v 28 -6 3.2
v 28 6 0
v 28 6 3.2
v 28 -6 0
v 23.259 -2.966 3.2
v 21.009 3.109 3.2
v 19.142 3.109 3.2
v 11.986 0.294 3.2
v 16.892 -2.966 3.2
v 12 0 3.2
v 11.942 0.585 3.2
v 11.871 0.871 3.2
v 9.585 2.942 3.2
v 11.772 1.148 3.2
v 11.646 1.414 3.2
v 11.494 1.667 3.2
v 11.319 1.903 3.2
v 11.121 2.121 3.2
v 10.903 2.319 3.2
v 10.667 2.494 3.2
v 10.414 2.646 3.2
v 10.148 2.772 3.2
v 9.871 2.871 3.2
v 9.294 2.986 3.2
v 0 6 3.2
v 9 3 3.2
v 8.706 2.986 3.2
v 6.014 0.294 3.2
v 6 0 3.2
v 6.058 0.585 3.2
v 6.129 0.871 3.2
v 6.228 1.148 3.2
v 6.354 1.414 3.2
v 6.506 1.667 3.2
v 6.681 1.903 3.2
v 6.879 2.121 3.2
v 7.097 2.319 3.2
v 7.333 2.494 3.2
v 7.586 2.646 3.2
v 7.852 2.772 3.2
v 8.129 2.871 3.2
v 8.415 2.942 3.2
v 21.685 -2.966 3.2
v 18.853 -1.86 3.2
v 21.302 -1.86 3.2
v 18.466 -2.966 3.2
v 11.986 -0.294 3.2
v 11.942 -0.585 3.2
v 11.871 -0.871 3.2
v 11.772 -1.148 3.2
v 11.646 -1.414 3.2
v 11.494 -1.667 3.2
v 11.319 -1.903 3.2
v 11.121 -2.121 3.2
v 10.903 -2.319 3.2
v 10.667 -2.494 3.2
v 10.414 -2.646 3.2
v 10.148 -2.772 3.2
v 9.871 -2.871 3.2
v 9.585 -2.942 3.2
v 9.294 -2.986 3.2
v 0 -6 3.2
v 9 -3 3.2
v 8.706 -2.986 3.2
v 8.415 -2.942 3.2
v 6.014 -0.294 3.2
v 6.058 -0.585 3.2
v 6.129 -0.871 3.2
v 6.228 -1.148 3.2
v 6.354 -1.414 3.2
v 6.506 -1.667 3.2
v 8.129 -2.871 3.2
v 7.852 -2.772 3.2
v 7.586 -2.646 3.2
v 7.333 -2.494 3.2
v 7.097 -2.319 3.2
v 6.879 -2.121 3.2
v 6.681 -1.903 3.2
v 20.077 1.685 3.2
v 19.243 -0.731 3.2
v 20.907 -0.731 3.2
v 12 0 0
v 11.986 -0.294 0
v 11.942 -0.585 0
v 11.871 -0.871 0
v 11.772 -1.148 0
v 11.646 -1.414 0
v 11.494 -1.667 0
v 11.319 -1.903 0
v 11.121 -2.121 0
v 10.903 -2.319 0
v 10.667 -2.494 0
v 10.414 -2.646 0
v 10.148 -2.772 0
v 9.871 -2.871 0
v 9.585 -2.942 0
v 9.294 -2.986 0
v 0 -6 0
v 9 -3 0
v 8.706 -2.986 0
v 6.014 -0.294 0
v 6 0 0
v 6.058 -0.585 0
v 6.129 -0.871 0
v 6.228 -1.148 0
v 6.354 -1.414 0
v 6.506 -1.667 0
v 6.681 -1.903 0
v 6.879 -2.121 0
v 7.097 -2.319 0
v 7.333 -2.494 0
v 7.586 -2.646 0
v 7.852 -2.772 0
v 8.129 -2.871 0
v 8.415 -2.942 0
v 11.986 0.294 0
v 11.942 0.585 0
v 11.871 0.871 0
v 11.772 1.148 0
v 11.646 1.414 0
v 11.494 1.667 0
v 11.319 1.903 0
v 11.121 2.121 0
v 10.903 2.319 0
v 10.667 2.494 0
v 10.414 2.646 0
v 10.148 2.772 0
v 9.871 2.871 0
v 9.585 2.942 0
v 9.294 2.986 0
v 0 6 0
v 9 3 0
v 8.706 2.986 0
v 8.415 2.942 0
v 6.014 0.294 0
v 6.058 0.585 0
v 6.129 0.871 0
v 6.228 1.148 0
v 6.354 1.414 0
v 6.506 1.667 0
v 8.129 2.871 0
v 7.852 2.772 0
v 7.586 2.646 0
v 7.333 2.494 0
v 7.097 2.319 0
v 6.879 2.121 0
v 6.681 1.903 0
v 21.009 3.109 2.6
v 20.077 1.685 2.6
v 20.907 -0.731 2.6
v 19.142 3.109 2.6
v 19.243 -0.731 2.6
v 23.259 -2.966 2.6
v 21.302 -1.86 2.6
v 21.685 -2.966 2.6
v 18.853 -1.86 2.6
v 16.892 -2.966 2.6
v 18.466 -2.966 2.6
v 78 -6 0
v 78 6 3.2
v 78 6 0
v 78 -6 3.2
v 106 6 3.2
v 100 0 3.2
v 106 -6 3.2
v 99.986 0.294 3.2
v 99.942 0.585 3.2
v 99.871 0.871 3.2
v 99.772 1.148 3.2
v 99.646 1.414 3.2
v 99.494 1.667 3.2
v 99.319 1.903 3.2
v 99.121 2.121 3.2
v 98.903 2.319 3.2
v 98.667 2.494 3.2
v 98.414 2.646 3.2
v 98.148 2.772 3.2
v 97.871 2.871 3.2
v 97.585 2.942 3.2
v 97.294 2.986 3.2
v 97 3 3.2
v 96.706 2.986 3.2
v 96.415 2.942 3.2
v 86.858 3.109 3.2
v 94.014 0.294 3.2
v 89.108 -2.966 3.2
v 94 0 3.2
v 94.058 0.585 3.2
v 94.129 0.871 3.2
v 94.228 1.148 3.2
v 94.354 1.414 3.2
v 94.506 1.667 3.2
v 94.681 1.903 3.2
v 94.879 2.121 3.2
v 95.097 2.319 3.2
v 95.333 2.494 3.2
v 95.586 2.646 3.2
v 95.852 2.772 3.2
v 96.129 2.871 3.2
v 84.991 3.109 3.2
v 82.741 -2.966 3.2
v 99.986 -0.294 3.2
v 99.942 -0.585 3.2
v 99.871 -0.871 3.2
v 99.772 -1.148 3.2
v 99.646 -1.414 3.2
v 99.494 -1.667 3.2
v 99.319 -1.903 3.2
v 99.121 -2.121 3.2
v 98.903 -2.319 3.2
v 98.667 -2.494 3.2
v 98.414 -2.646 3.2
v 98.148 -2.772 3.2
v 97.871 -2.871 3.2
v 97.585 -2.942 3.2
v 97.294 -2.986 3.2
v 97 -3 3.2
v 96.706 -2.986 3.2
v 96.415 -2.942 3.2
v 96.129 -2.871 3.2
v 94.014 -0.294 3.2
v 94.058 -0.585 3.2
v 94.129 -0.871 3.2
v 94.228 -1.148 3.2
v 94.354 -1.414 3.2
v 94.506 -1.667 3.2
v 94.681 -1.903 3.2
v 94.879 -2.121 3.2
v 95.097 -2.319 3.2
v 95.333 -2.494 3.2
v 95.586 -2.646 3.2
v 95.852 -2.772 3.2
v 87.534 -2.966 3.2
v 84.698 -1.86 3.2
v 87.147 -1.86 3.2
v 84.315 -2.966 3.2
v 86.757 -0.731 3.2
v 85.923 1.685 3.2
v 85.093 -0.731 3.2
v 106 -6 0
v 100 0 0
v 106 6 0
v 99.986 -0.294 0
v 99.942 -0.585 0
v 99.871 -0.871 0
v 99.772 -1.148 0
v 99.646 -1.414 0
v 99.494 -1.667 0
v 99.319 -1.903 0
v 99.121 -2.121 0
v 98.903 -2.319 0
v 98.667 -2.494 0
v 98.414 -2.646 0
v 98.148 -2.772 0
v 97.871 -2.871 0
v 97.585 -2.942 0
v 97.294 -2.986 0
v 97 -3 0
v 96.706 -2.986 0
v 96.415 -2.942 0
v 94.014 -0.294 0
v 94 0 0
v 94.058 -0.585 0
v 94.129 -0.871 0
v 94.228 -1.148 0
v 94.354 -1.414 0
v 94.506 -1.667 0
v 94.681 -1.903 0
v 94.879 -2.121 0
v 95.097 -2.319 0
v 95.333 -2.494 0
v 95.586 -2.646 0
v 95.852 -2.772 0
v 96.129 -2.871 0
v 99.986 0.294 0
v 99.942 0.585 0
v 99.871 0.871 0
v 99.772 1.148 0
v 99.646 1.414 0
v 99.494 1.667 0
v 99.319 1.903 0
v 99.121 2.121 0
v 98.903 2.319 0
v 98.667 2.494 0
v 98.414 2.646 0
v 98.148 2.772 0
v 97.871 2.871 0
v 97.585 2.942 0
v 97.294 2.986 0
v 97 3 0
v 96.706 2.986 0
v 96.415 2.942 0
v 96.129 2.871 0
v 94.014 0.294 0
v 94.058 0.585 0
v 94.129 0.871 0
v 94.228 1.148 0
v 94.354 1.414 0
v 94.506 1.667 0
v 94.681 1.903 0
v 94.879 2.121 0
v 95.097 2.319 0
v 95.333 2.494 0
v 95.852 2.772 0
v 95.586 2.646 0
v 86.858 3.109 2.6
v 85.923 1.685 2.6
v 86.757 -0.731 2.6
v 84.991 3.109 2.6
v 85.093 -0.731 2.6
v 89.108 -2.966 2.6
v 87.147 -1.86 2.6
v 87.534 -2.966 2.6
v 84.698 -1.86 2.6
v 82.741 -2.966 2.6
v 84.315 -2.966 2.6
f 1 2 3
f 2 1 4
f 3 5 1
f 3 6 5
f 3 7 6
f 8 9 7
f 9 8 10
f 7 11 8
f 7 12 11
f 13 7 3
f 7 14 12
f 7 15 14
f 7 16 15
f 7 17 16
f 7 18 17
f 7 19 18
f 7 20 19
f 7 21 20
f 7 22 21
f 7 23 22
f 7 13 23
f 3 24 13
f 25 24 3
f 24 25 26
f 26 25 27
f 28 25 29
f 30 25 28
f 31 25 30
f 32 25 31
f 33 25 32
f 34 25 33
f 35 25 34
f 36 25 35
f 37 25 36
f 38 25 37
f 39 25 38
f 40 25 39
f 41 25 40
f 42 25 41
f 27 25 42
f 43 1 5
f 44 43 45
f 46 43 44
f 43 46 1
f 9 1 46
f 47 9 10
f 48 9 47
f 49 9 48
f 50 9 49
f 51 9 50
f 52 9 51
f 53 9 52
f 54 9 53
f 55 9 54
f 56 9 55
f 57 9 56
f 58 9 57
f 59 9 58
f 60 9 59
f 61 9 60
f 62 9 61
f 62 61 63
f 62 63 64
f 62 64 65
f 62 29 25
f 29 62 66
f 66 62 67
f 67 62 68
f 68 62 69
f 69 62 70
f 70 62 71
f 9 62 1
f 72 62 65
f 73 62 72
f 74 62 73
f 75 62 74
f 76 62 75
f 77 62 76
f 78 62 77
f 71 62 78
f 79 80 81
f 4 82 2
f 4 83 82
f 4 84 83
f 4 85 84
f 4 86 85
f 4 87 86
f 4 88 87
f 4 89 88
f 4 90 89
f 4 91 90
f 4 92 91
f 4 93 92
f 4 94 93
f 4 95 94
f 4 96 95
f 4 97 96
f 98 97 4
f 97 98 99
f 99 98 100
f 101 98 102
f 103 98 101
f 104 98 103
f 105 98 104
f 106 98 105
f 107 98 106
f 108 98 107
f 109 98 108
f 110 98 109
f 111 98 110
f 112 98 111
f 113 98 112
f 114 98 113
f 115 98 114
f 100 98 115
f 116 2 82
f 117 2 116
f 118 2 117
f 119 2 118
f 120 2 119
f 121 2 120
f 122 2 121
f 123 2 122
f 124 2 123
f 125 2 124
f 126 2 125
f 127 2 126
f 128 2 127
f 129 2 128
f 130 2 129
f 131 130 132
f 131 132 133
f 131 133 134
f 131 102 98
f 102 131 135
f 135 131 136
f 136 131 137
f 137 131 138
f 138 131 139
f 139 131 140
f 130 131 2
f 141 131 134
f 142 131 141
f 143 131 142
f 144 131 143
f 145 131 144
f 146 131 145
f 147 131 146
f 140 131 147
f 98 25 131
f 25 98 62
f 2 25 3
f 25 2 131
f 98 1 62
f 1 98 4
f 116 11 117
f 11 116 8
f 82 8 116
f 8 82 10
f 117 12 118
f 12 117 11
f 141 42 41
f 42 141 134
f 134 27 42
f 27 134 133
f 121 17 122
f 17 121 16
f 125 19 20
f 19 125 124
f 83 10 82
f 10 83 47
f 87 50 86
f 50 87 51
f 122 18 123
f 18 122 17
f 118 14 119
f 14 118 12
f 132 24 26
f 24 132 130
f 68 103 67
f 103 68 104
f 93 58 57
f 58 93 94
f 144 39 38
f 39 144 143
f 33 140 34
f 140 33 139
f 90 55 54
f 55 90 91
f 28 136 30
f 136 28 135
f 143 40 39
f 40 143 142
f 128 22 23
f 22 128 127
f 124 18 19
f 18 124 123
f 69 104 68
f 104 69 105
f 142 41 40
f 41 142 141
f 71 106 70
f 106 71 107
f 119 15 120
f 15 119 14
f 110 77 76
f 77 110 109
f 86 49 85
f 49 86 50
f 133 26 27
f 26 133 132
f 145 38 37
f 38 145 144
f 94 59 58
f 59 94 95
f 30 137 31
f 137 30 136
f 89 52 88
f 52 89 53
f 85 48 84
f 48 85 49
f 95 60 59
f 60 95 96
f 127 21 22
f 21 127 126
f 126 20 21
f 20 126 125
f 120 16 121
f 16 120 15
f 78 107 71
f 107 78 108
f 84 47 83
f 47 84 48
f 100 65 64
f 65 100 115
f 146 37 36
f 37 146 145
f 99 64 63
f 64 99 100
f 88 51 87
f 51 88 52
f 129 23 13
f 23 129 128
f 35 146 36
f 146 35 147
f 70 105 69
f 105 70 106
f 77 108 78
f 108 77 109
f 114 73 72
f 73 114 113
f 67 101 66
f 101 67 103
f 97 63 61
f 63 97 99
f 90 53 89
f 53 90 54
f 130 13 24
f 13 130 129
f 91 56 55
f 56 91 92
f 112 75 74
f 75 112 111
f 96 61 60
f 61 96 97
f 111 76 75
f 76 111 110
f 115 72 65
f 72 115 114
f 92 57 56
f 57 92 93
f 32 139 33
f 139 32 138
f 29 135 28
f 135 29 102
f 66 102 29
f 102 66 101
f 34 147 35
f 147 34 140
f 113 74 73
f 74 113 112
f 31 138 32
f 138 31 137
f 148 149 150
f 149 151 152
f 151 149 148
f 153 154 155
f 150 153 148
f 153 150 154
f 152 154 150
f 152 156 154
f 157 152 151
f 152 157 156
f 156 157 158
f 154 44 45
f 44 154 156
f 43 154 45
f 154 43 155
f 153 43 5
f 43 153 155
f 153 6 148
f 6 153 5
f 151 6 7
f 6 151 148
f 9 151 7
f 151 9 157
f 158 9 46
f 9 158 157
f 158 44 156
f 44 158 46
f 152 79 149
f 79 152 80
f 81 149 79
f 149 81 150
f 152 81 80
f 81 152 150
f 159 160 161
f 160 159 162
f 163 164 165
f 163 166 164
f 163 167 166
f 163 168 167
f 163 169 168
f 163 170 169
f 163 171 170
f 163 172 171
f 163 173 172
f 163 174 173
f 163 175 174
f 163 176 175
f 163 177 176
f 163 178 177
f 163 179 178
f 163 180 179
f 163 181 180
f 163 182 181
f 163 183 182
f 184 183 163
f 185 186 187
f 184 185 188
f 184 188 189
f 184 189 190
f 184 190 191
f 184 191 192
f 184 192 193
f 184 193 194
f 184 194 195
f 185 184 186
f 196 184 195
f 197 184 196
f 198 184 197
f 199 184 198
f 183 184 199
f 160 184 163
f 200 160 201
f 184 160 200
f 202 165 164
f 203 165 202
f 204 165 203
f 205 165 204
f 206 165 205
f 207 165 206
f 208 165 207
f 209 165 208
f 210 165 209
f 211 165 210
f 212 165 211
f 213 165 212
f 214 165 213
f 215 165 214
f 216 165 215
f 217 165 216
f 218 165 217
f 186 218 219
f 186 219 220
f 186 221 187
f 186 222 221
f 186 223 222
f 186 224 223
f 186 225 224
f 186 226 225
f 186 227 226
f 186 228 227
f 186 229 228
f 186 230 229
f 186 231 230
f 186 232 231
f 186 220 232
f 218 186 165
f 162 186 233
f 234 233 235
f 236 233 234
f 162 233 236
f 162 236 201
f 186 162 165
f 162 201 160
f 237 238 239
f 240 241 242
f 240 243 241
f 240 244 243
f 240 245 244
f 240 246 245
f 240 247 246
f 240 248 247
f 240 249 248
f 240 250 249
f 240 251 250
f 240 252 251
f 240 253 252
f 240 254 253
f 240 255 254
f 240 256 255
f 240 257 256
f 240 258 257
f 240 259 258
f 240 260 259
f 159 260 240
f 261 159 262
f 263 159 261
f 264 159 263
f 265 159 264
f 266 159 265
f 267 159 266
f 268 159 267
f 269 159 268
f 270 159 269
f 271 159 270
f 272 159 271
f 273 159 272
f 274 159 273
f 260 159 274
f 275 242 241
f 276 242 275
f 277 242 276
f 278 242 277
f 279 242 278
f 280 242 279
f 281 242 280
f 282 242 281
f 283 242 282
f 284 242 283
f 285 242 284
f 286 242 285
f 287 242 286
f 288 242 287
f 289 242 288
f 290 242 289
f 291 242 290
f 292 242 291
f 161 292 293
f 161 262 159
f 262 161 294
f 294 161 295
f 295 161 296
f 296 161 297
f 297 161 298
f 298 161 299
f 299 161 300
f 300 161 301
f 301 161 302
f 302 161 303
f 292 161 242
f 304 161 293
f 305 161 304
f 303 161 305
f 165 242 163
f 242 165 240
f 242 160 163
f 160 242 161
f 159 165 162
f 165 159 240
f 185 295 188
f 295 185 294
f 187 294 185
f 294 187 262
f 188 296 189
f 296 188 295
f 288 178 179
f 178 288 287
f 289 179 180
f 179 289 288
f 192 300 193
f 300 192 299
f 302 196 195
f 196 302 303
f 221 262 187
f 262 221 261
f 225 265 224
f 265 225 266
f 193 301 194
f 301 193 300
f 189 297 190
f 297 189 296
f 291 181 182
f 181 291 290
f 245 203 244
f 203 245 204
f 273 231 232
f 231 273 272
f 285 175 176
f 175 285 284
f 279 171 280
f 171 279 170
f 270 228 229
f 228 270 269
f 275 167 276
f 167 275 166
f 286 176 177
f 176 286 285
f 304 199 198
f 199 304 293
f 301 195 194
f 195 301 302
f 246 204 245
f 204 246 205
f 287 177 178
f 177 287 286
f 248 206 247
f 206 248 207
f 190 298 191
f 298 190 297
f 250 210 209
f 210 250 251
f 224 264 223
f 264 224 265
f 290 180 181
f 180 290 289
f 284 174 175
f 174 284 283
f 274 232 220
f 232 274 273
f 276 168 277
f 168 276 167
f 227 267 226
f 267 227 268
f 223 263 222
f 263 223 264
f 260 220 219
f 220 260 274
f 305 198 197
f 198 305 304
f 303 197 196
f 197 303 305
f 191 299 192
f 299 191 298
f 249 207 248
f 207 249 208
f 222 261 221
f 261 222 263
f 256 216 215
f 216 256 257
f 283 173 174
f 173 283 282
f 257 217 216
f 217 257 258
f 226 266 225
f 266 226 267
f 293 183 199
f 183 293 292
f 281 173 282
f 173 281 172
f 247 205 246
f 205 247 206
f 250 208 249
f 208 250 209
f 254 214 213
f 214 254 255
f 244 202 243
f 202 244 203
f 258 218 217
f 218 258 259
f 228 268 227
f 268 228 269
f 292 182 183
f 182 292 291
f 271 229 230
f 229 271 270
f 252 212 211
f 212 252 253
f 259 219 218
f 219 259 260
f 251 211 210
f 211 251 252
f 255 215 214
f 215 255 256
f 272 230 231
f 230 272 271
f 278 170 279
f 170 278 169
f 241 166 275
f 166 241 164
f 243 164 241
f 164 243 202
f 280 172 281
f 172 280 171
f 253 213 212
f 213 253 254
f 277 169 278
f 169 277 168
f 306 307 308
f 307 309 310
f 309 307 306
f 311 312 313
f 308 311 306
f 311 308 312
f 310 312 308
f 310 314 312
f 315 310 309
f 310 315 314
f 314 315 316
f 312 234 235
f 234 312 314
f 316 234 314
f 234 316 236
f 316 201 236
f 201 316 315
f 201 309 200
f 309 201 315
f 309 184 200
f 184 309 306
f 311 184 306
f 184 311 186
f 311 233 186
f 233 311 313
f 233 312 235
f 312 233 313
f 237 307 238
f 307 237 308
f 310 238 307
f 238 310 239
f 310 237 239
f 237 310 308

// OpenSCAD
// PETG + TPU joint test coupons
// -----------------------------------------------------------------------
// Pull coupons: PETG grip - TPU strap - PETG grip, printed flat. Every
// coupon type joins the TPU to the PETG a different way (the same way at
// both ends). Hook one grip on something solid, pull the other with a
// luggage scale, and note the peak reading when a joint lets go - or that
// the TPU stretched to about twice its length without the joint failing.
//
// The strap narrows to 8 mm in the middle, so a joint that is as strong as
// the TPU itself shows up as a long stretch instead of a failure.
//
//   A  butt joint, flat face side by side in each layer (baseline)
//   B  butt joint + Bambu Studio "Use beam interlocking" (object setting)
//   C  lap joint: TPU printed on top of a PETG tongue (layer-on-layer)
//   D  one large dovetail through the full thickness
//   E  three small dovetails (finger joint)
//   F  encapsulated T-anchor: a thin PETG tongue fully wrapped in TPU
//   G  riveted tongue: TPU wraps a PETG tongue and fills two holes in it
//   H  encapsulated T-anchor + beam interlocking (best combination)
//   P  peel strip: TPU printed on a PETG plate, peeled at 90 degrees
//      (the worst case for any bonded joint)

part = "petg";      // [petg, tpu]
type = "A";         // [A, B, C, D, E, F, G, H, P]

grip_l = 28;
gauge_l = 50;
shoulder_l = 14;    // full-width TPU next to each joint before the strap narrows
w = 12;
w_gauge = 8;
t = 3.2;            // 16 layers at 0.2 mm
hole_d = 6;
label_depth = 0.6;

tongue_z = [1.0, 2.2];   // embedded tongues (types F, G, H): 1.0 mm of TPU above and below

$fn = 64;
eps = 0.01;
total_l = 2 * grip_l + gauge_l;

// ---------------------------------------------------------------------
// Outline of the whole coupon (dog-bone)
// ---------------------------------------------------------------------
module outline_2d() {
    translate([0, -w / 2]) square([grip_l + shoulder_l, w]);
    translate([total_l - grip_l - shoulder_l, -w / 2]) square([grip_l + shoulder_l, w]);
    // strap with generous transitions so it does not tear at the shoulders
    hull() for (x = [grip_l + shoulder_l + 5, total_l - grip_l - shoulder_l - 5])
        translate([x, 0]) square([eps, w_gauge], center = true);
    for (s = [0, 1]) {
        x0 = s == 0 ? grip_l + shoulder_l : total_l - grip_l - shoulder_l;
        dir = s == 0 ? 1 : -1;
        hull() {
            translate([x0 - dir * eps, 0]) square([eps, w], center = true);
            translate([x0 + dir * 5, 0]) square([eps, w_gauge], center = true);
        }
    }
}

// ---------------------------------------------------------------------
// PETG grip with the joint feature of each type, for the left end
// (the right end is the same, mirrored)
// ---------------------------------------------------------------------
module dovetail_2d(neck, head, depth) polygon([[0, -neck / 2], [depth, -head / 2], [depth, head / 2], [0, neck / 2]]);

module grip_left_3d() difference() {
    union() {
        translate([0, -w / 2, 0]) cube([grip_l, w, t]);
        if (type == "C")
            translate([grip_l - eps, -w / 2, 0]) cube([10 + eps, w, t / 2]);
        if (type == "D")
            translate([grip_l - eps, 0, 0]) linear_extrude(t) dovetail_2d(4.5, 8.5, 7);
        if (type == "E")
            for (y = [-3.6, 0, 3.6]) translate([grip_l - eps, y, 0]) linear_extrude(t) dovetail_2d(1.8, 3.2, 5);
        if (type == "F" || type == "H")
            translate([0, 0, tongue_z[0]]) linear_extrude(tongue_z[1] - tongue_z[0]) {
                translate([grip_l - eps, -3]) square([8 + eps, 6]);
                translate([grip_l + 8, -5]) square([3, 10]);
            }
        if (type == "G")
            translate([0, 0, tongue_z[0]]) linear_extrude(tongue_z[1] - tongue_z[0]) difference() {
                translate([grip_l - eps, -4]) square([11 + eps, 8]);
                for (x = [grip_l + 3.5, grip_l + 8]) translate([x, 0]) circle(d = 2.4);
            }
    }
    translate([9, 0, -1]) cylinder(d = hole_d, h = t + 2);
    // engraved type letter on top of the grip
    translate([20, 0, t - label_depth]) linear_extrude(label_depth + 1)
        text(type, size = 6, font = "DejaVu Sans:style=Bold", halign = "center", valign = "center");
}

module petg_pull_3d() {
    grip_left_3d();
    translate([total_l, 0, 0]) mirror([1, 0, 0]) grip_left_3d();
}

module tpu_pull_3d() difference() {
    linear_extrude(t) outline_2d();
    // keep the TPU off the grips themselves (they are PETG), and out of the PETG features
    translate([-1, -w, -1]) cube([grip_l + 1, 2 * w, t + 2]);
    translate([total_l - grip_l, -w, -1]) cube([grip_l + 1, 2 * w, t + 2]);
    petg_pull_3d();
}

// ---------------------------------------------------------------------
// Peel coupon (P)
// ---------------------------------------------------------------------
peel_base_l = 50; peel_bond_l = 35; peel_base_t = 2.0; peel_strip_t = 1.6; peel_tail_l = 40;
module petg_peel_3d() difference() {
    translate([0, -w / 2, 0]) cube([peel_base_l, w, peel_base_t]);
    translate([8, 0, -1]) cylinder(d = hole_d, h = 5);
}
module tpu_peel_3d() difference() {
    union() {
        // bonded on top of the PETG plate
        translate([peel_base_l - peel_bond_l, -w / 2, peel_base_t]) cube([peel_bond_l, w, peel_strip_t]);
        // down the end of the plate and along the bed, so the tail lies flat
        translate([peel_base_l, -w / 2, 0]) cube([2, w, peel_base_t + peel_strip_t]);
        translate([peel_base_l, -w / 2, 0]) cube([peel_tail_l, w, peel_strip_t]);
    }
    translate([peel_base_l + peel_tail_l - 7, 0, -1]) cylinder(d = hole_d, h = 5);
}

// ---------------------------------------------------------------------
if (type == "P") { if (part == "petg") petg_peel_3d(); else tpu_peel_3d(); }
else { if (part == "petg") petg_pull_3d(); else tpu_pull_3d(); }
